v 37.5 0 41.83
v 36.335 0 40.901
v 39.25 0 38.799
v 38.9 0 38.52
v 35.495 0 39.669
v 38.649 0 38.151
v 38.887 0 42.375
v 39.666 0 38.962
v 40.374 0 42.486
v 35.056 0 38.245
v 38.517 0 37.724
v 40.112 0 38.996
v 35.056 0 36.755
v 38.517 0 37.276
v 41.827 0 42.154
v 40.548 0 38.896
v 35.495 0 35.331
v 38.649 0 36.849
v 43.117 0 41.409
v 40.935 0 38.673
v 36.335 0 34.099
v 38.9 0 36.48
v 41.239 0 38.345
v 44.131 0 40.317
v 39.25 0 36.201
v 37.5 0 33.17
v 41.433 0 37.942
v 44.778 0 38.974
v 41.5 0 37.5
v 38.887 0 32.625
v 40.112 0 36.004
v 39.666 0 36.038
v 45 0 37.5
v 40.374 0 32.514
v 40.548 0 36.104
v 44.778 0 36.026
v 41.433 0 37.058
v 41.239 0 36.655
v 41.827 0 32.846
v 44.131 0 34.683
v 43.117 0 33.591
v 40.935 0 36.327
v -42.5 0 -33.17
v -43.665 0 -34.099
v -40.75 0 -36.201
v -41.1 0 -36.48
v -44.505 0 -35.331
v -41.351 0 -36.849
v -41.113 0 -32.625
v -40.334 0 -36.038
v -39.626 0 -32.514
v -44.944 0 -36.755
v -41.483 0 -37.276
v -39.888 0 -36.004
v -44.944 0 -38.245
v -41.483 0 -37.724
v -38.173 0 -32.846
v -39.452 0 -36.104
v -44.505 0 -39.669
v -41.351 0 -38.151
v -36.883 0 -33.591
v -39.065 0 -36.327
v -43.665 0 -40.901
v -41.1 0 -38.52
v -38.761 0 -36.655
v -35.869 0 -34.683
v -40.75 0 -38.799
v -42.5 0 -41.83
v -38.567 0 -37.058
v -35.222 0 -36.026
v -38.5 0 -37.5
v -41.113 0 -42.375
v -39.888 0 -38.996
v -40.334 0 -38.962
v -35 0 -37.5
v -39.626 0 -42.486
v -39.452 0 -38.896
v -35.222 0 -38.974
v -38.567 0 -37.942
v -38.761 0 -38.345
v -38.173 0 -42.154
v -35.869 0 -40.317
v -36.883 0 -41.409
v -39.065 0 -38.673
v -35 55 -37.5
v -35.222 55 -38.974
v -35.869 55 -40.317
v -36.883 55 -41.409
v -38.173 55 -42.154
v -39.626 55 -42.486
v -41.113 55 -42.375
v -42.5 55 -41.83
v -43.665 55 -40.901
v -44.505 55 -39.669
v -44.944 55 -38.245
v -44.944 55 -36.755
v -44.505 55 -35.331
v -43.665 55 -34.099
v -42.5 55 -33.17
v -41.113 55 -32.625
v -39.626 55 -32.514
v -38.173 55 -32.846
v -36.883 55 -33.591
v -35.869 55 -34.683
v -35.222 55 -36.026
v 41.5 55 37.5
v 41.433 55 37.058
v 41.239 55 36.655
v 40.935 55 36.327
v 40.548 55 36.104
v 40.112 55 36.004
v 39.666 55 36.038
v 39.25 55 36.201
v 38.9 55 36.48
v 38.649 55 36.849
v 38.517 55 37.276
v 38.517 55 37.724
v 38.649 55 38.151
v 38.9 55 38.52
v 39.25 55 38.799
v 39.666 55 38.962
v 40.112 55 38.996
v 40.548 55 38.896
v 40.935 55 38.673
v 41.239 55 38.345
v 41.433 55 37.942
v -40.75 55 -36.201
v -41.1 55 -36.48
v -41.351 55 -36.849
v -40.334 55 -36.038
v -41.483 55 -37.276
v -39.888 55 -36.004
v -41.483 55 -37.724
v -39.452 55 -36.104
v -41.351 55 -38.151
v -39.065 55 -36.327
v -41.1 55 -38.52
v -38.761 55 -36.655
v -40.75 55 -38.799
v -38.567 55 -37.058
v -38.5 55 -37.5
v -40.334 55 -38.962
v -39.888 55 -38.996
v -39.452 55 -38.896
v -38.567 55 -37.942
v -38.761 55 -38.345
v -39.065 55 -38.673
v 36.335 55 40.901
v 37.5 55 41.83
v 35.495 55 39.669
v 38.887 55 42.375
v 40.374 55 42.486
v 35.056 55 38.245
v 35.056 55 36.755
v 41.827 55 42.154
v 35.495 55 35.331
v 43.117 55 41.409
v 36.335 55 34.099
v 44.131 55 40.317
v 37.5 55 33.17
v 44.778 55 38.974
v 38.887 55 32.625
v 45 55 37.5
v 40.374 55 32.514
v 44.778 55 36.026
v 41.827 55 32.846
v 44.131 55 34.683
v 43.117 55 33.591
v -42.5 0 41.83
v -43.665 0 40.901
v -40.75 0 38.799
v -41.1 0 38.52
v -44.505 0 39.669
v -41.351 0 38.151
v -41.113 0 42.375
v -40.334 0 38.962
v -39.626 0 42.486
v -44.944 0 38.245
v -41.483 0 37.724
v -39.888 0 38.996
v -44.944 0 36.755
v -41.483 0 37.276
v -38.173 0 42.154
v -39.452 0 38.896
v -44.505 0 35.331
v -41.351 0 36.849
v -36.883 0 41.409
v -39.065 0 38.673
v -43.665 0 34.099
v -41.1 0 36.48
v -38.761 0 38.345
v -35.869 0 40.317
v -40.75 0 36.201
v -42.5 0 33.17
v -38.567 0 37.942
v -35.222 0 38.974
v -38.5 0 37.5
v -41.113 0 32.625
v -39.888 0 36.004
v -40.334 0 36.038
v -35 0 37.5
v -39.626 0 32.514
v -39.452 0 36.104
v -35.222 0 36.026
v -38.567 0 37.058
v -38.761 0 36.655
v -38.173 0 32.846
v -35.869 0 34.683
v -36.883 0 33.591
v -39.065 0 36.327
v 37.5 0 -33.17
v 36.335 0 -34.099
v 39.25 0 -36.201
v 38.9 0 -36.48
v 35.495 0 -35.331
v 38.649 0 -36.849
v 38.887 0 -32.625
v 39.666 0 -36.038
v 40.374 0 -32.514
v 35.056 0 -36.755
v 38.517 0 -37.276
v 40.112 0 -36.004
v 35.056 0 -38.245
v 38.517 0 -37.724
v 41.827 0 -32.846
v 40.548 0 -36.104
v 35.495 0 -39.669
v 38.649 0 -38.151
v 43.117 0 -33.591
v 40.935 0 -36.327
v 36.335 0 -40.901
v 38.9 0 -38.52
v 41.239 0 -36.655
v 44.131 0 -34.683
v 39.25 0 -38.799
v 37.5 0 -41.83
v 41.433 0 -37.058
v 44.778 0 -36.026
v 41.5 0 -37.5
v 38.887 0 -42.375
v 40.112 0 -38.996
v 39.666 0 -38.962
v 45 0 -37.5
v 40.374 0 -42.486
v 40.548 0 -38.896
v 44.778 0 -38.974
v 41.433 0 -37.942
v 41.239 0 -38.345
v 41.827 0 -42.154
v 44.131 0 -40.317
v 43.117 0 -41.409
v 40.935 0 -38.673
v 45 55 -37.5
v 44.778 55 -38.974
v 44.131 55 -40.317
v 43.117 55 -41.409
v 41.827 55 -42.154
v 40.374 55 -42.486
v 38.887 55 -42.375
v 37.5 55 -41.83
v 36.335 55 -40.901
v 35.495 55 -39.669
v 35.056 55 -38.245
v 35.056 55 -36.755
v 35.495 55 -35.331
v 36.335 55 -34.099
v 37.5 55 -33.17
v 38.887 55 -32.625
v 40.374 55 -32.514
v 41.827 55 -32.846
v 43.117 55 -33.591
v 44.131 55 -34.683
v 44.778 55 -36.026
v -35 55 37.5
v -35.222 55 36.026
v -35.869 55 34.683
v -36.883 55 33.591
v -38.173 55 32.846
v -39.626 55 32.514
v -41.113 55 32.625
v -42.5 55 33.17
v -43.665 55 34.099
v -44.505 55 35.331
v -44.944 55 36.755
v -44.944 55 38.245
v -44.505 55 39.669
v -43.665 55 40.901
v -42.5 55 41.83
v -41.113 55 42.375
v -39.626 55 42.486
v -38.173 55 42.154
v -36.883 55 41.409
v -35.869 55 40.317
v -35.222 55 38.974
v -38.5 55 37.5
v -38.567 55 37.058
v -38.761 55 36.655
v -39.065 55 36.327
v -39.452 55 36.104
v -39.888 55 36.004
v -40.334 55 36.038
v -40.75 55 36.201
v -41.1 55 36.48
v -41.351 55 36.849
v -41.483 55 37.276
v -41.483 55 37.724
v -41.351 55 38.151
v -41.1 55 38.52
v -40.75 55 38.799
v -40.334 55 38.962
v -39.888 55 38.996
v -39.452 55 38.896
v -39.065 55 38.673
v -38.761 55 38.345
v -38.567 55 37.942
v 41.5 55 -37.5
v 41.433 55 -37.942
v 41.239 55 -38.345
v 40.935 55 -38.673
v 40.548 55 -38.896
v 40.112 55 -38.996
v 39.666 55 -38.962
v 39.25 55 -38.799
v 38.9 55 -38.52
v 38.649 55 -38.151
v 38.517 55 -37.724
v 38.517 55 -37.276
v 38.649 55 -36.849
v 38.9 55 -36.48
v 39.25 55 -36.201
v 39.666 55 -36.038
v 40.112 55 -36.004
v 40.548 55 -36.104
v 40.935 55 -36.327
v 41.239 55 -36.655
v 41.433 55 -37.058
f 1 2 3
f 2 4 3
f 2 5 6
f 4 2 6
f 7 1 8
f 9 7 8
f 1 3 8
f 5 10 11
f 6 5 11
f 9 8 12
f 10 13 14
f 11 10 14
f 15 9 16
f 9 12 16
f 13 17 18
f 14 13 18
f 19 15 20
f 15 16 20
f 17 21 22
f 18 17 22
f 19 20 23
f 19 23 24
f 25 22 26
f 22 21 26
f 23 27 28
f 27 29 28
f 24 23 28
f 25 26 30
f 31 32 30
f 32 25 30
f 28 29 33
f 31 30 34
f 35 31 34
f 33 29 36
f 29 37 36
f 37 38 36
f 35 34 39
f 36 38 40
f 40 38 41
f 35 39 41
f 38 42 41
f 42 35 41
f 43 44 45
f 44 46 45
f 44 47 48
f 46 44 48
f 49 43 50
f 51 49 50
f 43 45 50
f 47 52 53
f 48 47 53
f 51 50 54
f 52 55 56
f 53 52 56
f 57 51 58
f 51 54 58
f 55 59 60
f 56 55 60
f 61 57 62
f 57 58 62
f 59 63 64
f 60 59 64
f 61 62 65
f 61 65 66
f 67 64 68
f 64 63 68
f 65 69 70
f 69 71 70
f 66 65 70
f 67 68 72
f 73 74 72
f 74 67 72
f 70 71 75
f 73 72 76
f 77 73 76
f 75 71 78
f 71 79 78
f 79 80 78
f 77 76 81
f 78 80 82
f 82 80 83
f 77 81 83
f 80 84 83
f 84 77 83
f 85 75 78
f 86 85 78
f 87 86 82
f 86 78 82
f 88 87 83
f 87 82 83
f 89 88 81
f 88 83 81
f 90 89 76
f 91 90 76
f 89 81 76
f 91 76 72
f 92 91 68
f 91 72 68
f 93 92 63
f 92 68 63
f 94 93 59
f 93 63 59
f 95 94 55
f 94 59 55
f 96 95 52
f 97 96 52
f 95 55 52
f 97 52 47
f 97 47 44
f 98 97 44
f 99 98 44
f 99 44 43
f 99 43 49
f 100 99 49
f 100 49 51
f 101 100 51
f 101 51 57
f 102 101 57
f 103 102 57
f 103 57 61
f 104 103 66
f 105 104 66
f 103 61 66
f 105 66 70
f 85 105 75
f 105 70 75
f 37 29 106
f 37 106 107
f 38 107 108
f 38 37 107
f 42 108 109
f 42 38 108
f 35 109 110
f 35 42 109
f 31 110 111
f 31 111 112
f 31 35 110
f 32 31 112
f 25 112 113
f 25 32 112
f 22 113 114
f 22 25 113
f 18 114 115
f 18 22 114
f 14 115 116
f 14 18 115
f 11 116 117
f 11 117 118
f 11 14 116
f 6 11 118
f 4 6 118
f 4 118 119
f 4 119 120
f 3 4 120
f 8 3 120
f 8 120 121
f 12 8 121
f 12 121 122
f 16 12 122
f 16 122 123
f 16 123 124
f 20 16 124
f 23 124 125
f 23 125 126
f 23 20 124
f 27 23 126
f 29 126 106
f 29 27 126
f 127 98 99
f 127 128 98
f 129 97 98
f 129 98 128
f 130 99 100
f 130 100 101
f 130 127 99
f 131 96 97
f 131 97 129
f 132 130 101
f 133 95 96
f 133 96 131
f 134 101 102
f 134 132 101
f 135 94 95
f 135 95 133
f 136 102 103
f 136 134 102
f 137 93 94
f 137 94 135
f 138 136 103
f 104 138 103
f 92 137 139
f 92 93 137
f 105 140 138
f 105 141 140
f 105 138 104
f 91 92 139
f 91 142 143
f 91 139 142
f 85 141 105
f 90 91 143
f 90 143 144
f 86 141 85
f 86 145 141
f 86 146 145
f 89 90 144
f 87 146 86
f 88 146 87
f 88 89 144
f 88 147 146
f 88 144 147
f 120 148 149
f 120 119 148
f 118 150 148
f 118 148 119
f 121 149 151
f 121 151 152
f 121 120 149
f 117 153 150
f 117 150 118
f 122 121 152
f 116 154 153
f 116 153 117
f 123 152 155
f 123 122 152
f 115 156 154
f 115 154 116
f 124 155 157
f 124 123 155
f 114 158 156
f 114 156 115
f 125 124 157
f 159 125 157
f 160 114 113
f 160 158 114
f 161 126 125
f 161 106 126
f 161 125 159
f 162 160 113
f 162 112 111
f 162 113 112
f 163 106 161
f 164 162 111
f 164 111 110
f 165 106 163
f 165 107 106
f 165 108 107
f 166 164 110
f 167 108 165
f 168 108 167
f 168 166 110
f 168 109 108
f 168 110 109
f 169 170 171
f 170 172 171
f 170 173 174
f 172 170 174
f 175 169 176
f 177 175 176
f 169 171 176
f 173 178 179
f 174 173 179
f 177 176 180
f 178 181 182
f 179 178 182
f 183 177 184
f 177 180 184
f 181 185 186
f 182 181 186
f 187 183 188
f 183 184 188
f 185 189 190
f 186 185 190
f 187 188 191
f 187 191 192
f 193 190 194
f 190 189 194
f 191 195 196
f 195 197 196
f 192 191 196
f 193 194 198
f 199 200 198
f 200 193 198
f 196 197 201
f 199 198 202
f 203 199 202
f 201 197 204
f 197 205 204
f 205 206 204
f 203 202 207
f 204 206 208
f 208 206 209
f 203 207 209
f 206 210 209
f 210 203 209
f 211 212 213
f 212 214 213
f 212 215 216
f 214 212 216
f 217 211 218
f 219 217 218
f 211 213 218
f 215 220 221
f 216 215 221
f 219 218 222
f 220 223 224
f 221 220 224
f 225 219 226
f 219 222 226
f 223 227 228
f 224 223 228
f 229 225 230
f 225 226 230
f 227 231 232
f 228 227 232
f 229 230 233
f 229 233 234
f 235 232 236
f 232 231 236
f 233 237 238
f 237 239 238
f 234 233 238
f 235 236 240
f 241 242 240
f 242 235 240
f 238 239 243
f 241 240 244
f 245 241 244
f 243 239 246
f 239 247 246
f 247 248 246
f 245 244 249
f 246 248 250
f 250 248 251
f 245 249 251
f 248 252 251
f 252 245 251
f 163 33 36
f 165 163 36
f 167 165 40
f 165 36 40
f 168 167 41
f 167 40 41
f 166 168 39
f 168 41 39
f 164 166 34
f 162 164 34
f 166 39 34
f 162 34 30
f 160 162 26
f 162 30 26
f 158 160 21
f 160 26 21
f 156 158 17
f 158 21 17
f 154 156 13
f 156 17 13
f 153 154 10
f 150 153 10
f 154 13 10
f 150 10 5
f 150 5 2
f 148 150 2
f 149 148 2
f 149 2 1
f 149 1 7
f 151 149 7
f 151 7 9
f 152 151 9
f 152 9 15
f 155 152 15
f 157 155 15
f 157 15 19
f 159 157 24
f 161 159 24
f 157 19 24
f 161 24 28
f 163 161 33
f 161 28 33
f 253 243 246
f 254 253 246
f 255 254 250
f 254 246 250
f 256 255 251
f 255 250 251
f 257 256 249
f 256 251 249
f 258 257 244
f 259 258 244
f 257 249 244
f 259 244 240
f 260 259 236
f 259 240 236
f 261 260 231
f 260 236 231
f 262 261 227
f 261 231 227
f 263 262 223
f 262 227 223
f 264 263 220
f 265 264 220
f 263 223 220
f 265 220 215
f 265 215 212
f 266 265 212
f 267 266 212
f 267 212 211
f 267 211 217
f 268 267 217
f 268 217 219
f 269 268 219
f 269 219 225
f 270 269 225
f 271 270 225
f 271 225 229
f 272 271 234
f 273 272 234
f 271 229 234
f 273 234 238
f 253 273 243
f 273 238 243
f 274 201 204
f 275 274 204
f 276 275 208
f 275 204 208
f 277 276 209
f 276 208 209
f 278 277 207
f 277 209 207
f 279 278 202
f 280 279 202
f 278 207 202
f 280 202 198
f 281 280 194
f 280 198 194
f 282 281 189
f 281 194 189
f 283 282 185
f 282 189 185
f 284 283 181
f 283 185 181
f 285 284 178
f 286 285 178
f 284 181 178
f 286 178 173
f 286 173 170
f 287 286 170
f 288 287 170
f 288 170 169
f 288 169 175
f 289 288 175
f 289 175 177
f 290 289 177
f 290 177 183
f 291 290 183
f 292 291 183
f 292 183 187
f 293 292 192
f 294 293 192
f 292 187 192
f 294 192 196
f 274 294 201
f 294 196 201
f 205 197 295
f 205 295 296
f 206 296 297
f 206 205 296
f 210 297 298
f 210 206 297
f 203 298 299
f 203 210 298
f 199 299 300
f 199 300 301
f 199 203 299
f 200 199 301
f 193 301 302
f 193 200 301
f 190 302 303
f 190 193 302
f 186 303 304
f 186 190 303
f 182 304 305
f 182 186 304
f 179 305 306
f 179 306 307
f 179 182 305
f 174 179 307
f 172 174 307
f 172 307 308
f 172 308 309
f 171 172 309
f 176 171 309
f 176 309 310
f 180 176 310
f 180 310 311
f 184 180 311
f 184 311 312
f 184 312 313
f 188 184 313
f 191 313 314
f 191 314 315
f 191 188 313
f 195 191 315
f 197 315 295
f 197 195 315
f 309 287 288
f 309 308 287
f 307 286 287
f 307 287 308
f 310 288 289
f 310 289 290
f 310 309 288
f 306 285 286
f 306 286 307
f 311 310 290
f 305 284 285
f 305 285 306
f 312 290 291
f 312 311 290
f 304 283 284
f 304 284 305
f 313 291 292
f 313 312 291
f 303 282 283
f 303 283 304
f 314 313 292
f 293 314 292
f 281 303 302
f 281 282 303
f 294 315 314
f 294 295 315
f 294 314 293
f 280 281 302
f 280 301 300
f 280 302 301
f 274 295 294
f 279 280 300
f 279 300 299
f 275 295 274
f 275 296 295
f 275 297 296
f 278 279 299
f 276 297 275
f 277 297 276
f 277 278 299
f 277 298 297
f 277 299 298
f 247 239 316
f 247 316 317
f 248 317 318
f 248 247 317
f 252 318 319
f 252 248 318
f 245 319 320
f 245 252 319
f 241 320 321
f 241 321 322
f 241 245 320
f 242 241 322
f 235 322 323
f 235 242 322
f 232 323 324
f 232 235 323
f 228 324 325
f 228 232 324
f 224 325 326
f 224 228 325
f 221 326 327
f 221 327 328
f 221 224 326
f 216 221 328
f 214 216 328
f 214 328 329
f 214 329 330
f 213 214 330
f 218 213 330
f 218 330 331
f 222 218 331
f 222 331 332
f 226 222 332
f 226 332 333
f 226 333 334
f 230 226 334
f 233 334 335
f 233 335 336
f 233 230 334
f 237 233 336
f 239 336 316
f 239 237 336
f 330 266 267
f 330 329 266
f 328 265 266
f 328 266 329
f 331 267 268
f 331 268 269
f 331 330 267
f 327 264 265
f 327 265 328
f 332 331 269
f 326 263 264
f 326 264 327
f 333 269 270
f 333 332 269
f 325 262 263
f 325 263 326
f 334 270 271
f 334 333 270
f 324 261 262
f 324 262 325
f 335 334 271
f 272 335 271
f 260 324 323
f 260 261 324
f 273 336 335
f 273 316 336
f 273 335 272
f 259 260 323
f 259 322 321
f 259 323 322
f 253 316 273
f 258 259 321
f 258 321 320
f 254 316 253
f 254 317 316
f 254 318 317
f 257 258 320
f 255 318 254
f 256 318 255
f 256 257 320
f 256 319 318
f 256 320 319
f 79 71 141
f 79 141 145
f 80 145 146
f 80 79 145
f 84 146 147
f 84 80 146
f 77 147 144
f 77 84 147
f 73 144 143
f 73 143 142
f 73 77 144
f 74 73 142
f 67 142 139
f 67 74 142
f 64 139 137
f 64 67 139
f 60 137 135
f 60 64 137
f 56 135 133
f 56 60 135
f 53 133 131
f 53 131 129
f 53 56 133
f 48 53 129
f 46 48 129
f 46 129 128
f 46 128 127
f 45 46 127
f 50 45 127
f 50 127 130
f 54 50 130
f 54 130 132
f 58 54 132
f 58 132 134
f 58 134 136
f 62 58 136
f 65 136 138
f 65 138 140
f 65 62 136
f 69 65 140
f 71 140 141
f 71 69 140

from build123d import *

# Parameters (mm, degrees)
SKETCH1_R             = 5
SKETCH1_R_2           = 1.5
BOSS_EXTRUDE1_DEPTH   = 55
BOSS_EXTRUDE1_2_DEPTH = 55
BOSS_EXTRUDE1_3_DEPTH = 55
BOSS_EXTRUDE1_4_DEPTH = 55


with BuildPart() as part:
    # Sketch1 → Boss-Extrude1 (new body)
    with BuildSketch(Plane(origin=(0, 0, 0), x_dir=(1, 0, 0), z_dir=(0, 1, 0))):
        with Locations((-40, 37.5)):
            Circle(SKETCH1_R)
        with Locations((-40, 37.5)):
            Circle(SKETCH1_R_2, mode=Mode.SUBTRACT)
    extrude(amount=BOSS_EXTRUDE1_DEPTH)


with BuildPart() as body_2:
    # Sketch1 → Boss-Extrude1 2 (new body)
    with BuildSketch(Plane(origin=(0, 0, 0), x_dir=(1, 0, 0), z_dir=(0, 1, 0))):
        with Locations((40, 37.5)):
            Circle(SKETCH1_R)
        with Locations((40, 37.5)):
            Circle(SKETCH1_R_2, mode=Mode.SUBTRACT)
    extrude(amount=BOSS_EXTRUDE1_2_DEPTH)


with BuildPart() as body_3:
    # Sketch1 → Boss-Extrude1 3 (new body)
    with BuildSketch(Plane(origin=(0, 0, 0), x_dir=(1, 0, 0), z_dir=(0, 1, 0))):
        with Locations((40, -37.5)):
            Circle(SKETCH1_R)
        with Locations((40, -37.5)):
            Circle(SKETCH1_R_2, mode=Mode.SUBTRACT)
    extrude(amount=BOSS_EXTRUDE1_3_DEPTH)


with BuildPart() as body_4:
    # Sketch1 → Boss-Extrude1 4 (new body)
    with BuildSketch(Plane(origin=(0, 0, 0), x_dir=(1, 0, 0), z_dir=(0, 1, 0))):
        with Locations((-40, -37.5)):
            Circle(SKETCH1_R)
        with Locations((-40, -37.5)):
            Circle(SKETCH1_R_2, mode=Mode.SUBTRACT)
    extrude(amount=BOSS_EXTRUDE1_4_DEPTH)


solid = Compound([part.part, body_2.part, body_3.part, body_4.part])
